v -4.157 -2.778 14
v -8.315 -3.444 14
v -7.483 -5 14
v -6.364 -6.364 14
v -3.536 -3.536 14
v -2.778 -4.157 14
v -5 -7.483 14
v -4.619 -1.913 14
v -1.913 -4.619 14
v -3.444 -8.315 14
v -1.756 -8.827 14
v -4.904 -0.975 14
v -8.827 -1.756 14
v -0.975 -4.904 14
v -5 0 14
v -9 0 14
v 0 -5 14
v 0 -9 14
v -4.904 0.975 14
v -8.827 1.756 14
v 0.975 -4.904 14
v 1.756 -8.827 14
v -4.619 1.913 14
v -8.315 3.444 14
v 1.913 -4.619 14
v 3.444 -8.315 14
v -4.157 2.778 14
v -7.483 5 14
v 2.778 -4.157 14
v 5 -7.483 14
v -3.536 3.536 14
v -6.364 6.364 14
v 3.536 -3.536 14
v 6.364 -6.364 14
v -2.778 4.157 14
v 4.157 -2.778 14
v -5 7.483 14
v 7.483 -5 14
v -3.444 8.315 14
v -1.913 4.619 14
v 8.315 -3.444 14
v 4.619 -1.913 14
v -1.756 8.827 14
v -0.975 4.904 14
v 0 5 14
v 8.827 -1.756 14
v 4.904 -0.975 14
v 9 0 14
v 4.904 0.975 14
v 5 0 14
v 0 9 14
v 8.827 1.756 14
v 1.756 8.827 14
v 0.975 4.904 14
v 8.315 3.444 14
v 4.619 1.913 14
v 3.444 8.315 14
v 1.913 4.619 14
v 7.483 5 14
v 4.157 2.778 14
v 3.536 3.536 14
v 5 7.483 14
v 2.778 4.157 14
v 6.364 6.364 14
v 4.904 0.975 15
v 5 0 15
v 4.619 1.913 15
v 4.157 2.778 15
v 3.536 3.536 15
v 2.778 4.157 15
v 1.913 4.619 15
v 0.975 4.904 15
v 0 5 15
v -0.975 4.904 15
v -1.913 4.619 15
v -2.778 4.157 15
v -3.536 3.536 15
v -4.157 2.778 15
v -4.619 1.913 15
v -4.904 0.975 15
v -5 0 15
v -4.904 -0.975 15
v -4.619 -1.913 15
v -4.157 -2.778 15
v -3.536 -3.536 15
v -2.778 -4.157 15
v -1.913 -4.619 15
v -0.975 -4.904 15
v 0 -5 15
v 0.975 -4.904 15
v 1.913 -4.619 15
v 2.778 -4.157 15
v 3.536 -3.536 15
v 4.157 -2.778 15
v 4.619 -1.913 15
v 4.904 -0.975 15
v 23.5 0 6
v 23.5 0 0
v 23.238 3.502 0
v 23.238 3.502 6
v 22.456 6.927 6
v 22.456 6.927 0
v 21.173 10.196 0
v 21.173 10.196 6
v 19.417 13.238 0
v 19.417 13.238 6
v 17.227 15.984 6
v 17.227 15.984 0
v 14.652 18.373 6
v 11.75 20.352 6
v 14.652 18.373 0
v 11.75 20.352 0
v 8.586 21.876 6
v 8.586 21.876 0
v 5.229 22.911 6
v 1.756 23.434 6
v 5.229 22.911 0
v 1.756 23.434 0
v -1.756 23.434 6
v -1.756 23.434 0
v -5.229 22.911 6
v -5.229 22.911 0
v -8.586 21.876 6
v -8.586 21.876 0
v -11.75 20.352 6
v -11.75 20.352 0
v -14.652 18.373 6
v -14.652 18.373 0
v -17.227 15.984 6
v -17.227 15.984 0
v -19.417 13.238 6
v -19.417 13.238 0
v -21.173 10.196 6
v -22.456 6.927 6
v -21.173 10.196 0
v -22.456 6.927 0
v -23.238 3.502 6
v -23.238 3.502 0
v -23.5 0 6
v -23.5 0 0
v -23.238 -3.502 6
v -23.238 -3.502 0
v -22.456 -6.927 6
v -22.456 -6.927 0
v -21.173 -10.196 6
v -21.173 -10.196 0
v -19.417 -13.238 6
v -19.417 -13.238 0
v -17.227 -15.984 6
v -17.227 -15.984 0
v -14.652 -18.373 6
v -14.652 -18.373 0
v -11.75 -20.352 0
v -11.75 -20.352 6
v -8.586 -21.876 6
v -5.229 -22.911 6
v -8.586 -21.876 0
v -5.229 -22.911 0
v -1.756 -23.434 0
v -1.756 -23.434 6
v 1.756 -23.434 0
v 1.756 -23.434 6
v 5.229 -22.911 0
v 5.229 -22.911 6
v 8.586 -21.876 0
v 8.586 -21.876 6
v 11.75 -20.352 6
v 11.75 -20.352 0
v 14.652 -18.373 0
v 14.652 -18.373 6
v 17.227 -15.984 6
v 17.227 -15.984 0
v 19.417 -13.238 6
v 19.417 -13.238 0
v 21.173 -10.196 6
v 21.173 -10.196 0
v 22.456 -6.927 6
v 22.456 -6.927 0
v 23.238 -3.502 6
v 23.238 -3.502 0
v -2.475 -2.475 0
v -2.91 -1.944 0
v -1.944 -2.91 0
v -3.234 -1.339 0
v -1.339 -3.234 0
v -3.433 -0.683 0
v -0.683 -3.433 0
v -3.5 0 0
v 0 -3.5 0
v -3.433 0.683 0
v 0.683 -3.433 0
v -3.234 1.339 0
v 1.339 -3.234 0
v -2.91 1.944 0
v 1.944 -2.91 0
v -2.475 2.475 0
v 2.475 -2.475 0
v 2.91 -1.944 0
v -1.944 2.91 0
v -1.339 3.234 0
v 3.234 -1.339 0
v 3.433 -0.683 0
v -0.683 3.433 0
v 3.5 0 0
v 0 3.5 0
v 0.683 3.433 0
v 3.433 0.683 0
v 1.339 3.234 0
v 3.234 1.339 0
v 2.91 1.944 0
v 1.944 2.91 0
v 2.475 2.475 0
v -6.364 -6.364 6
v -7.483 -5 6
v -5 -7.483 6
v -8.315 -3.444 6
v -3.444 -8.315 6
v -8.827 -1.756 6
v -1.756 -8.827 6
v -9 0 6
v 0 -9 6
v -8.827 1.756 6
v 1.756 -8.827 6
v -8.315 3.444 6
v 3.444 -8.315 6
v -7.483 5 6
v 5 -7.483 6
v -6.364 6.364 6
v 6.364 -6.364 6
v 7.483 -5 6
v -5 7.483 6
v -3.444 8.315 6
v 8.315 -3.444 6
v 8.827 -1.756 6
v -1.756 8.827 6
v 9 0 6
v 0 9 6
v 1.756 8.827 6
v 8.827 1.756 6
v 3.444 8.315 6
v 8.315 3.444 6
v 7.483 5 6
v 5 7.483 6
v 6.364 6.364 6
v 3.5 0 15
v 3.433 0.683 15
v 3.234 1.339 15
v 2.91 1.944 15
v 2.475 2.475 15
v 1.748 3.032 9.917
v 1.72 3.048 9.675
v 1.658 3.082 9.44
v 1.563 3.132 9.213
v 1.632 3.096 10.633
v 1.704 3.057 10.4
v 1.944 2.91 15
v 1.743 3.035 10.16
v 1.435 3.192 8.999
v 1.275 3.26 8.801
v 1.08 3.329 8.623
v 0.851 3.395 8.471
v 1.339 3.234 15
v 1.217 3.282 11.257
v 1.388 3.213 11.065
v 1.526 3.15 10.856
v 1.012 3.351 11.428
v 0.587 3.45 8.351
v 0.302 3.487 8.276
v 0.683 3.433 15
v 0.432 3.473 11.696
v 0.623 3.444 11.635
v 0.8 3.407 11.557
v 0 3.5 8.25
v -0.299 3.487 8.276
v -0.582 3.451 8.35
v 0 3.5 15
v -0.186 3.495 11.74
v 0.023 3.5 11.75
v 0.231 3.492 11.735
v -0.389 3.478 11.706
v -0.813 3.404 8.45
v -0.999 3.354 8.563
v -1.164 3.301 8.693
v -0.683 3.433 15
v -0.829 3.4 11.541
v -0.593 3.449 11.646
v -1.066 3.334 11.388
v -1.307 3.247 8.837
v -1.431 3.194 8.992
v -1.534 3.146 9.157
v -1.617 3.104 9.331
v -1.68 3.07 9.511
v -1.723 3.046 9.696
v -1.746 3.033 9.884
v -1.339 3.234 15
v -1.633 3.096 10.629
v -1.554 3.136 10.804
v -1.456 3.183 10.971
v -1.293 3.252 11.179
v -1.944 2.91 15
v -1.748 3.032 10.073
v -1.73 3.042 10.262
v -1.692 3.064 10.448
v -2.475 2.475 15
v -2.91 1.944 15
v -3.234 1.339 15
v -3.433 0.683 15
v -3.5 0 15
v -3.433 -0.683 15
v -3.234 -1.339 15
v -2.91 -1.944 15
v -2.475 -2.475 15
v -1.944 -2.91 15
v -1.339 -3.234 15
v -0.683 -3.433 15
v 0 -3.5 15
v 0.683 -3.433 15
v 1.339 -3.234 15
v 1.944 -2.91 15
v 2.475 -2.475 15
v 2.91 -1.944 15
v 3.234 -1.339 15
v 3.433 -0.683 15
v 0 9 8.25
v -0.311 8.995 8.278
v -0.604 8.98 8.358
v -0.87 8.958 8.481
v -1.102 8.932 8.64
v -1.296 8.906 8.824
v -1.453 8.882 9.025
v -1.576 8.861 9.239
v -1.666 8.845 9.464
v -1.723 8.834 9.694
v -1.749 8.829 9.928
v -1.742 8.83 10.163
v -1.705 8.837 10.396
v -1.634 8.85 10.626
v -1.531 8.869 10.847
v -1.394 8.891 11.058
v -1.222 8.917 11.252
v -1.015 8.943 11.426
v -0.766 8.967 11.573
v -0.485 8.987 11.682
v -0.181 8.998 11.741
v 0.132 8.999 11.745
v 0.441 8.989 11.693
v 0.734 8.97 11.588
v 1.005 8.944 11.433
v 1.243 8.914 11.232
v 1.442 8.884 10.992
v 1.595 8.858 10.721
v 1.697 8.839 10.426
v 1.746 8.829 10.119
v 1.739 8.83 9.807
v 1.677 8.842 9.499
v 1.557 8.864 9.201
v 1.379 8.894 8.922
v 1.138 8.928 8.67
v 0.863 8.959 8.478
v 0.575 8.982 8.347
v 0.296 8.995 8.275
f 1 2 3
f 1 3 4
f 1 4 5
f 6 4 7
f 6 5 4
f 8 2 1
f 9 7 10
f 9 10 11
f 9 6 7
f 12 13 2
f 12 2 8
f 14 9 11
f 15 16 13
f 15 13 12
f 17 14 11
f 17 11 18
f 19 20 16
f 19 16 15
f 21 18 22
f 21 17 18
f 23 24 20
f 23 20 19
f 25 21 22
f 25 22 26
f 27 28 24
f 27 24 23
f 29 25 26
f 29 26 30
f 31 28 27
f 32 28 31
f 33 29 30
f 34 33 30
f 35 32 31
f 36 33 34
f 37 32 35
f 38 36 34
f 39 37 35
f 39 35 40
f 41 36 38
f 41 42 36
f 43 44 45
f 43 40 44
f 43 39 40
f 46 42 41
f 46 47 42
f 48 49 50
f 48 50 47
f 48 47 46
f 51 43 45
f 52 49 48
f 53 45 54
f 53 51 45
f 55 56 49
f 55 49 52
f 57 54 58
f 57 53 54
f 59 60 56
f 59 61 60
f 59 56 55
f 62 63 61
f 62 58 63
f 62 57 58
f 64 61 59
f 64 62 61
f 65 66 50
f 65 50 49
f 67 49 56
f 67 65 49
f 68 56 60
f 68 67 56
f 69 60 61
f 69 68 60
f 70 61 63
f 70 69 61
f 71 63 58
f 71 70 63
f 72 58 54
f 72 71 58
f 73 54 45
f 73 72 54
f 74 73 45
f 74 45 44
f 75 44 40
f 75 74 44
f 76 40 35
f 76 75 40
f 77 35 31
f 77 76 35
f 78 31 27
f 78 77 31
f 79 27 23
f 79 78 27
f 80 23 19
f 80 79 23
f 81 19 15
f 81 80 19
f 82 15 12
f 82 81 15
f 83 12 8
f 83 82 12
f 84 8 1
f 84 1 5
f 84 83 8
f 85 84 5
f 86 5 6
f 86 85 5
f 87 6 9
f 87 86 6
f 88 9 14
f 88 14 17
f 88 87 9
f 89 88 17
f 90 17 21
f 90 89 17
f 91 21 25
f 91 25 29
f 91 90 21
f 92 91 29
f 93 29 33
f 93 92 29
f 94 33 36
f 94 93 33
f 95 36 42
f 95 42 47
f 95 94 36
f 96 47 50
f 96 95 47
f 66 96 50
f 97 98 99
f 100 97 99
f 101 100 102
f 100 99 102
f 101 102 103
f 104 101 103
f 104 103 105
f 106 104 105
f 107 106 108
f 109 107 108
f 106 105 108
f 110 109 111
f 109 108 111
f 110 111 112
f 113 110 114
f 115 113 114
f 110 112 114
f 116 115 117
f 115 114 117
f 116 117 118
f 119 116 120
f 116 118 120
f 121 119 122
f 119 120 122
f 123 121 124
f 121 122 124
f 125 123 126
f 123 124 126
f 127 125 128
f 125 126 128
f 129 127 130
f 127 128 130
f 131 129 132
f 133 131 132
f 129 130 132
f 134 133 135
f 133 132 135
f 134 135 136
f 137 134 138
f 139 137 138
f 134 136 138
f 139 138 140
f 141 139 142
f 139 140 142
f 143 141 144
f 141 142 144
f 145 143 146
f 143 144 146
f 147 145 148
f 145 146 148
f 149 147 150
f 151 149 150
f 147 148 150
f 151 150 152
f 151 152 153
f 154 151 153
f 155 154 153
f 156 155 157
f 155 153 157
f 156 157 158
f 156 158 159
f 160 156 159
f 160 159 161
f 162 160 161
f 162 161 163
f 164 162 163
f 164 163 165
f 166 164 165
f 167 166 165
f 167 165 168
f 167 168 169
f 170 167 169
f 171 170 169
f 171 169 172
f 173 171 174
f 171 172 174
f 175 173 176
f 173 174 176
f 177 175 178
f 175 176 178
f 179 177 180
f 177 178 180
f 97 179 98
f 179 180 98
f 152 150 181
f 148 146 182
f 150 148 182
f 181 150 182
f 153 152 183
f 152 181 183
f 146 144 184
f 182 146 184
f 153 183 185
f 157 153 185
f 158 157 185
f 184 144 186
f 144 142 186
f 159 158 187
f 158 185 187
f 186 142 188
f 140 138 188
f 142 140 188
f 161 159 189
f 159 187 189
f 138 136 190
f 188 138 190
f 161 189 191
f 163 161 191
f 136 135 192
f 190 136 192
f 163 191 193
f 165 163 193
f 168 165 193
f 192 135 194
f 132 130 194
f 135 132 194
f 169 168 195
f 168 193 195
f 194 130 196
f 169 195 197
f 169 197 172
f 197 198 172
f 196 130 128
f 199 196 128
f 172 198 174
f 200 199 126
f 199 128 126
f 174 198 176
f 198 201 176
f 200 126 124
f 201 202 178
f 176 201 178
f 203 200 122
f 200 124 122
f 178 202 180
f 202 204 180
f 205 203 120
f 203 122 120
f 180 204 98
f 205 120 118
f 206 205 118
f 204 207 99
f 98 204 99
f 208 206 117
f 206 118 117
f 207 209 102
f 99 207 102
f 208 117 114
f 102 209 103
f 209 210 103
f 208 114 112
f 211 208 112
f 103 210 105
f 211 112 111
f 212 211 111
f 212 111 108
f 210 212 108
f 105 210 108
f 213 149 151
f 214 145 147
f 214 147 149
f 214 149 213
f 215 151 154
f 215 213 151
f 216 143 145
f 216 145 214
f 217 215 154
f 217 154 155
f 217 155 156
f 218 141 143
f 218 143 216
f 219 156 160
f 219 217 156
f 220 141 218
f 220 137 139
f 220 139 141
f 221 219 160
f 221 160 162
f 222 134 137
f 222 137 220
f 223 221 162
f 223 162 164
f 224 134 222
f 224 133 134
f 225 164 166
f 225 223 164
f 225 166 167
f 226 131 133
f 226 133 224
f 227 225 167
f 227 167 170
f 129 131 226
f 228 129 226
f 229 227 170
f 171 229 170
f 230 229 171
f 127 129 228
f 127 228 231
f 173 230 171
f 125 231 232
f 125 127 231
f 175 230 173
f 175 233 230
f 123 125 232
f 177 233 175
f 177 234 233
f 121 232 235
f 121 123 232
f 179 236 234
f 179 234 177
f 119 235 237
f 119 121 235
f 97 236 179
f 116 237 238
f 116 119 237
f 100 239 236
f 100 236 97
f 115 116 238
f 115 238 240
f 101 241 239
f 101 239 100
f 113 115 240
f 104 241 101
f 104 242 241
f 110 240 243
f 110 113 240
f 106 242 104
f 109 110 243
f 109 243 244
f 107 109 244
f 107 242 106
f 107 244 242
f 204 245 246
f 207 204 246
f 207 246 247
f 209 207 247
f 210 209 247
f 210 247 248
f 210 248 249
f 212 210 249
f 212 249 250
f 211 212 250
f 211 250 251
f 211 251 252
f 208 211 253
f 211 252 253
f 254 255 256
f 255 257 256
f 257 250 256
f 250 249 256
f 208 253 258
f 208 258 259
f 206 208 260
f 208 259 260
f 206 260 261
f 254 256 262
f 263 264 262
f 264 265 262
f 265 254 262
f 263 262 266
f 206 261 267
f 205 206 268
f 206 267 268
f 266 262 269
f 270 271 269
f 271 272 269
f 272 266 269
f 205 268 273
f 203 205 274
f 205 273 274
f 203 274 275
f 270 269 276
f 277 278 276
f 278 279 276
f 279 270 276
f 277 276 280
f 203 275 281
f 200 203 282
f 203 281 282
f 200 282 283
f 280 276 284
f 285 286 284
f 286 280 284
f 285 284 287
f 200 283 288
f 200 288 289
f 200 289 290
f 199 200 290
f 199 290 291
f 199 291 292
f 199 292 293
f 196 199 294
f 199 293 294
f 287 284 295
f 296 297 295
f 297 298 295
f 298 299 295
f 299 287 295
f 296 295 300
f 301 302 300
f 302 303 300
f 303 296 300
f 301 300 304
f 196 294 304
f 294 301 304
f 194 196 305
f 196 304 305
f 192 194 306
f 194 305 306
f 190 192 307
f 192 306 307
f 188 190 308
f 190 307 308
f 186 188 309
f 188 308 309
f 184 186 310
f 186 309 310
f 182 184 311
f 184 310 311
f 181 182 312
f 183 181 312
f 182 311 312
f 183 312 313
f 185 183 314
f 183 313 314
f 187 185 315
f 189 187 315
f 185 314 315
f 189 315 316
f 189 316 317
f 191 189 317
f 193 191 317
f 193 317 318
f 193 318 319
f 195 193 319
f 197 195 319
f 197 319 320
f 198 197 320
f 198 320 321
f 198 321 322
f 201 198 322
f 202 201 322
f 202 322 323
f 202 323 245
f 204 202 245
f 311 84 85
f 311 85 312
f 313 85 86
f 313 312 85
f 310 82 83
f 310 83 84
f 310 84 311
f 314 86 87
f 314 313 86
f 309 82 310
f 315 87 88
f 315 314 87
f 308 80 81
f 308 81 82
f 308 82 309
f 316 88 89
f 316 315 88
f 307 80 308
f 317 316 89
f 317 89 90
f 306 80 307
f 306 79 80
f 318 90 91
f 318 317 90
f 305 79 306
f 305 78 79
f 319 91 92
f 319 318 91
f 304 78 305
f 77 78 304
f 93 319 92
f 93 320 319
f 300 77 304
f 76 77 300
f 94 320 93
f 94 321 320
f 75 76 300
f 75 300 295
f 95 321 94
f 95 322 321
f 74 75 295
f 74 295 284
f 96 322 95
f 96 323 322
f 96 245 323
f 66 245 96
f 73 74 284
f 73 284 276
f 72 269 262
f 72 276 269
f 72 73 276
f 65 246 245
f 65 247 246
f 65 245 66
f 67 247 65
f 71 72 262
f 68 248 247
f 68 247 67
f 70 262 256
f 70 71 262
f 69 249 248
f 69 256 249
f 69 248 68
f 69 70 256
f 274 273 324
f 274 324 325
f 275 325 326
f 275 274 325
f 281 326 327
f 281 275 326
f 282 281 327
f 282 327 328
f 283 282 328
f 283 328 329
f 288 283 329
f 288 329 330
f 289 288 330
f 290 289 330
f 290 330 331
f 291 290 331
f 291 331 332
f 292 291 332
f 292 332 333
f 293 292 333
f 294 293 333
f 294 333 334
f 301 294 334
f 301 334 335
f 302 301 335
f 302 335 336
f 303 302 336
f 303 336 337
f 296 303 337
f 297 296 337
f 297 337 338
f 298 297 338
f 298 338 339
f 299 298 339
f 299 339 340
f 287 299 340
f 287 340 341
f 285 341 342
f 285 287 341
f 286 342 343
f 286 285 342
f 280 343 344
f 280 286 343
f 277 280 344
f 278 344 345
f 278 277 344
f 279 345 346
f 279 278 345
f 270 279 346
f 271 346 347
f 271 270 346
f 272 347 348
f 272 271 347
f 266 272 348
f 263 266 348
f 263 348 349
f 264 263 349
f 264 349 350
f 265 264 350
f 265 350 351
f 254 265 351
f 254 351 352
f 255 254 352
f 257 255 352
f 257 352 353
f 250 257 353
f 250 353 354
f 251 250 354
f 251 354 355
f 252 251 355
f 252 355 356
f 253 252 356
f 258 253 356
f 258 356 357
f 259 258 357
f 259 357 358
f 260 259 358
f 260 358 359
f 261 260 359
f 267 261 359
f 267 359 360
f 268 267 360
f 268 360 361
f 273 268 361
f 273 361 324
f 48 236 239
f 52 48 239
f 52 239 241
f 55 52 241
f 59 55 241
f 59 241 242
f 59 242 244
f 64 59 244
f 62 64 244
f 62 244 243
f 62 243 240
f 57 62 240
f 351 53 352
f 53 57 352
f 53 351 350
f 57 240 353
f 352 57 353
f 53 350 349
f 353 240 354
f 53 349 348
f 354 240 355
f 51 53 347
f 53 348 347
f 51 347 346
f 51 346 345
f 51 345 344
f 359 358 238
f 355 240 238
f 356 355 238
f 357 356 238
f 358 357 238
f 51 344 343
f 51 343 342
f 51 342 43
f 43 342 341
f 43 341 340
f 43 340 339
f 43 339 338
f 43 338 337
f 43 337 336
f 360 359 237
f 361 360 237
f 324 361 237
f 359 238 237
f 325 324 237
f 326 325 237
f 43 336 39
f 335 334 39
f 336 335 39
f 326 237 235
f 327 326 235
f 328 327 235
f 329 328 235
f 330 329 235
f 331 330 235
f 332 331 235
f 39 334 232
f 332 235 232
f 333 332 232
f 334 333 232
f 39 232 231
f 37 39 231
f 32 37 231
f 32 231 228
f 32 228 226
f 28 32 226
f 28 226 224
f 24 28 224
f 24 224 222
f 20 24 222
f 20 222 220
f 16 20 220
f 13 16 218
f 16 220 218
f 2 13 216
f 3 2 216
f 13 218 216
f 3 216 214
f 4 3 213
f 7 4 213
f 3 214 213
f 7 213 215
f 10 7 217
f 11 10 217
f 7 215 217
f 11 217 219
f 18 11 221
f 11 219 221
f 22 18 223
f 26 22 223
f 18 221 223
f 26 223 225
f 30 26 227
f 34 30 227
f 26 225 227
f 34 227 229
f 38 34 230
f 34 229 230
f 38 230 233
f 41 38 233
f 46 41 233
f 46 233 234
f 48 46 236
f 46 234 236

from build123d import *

# Parameters (mm, degrees)
SKETCH_1_R          = 23.5
EXTRUDE_1_DEPTH     = 6
SKETCH_2_R          = 9
EXTRUDE_2_DEPTH     = 8
SKETCH_3_R          = 3.5
CUT_EXTRUDE_1_DEPTH = 37.062445841
SKETCH_4_R          = 1.75
CUT_EXTRUDE_2_DEPTH = 37.062445841
EXTRUDE_START       = 1
SKETCH_5_R          = 5
SKETCH_5_R_2        = 3.5
EXTRUDE_3_DEPTH     = 1


with BuildPart() as part:
    # 草图1 → 凸台-拉伸1 (new body)
    with BuildSketch(Plane.XY):
        Circle(SKETCH_1_R)
    extrude(amount=EXTRUDE_1_DEPTH)

    # 草图2 → 凸台-拉伸2 (add)
    with BuildSketch(Plane.XY.offset(6)):
        Circle(SKETCH_2_R)
    extrude(amount=EXTRUDE_2_DEPTH)

    # 草图3 → 切除-拉伸1 (cut, through all)
    with BuildSketch(Plane.XY.offset(14)):
        Circle(SKETCH_3_R)
    extrude(amount=-CUT_EXTRUDE_1_DEPTH, mode=Mode.SUBTRACT)

    # 草图4 → 切除-拉伸2 (cut, through all)
    with BuildSketch(Plane(origin=(0, 0, 0), x_dir=(1, 0, 0), z_dir=(0, 1, 0))):
        with Locations(Location((0, -10, 0), (0, 0, 90))):
            Circle(SKETCH_4_R)
    extrude(amount=CUT_EXTRUDE_2_DEPTH, mode=Mode.SUBTRACT)

    # 草图5 → 凸台-拉伸3 (add)
    with BuildSketch(Plane.XY.offset(14).offset(EXTRUDE_START)):
        Circle(SKETCH_5_R)
        Circle(SKETCH_5_R_2, mode=Mode.SUBTRACT)
    extrude(amount=-EXTRUDE_3_DEPTH)


solid = part.part
